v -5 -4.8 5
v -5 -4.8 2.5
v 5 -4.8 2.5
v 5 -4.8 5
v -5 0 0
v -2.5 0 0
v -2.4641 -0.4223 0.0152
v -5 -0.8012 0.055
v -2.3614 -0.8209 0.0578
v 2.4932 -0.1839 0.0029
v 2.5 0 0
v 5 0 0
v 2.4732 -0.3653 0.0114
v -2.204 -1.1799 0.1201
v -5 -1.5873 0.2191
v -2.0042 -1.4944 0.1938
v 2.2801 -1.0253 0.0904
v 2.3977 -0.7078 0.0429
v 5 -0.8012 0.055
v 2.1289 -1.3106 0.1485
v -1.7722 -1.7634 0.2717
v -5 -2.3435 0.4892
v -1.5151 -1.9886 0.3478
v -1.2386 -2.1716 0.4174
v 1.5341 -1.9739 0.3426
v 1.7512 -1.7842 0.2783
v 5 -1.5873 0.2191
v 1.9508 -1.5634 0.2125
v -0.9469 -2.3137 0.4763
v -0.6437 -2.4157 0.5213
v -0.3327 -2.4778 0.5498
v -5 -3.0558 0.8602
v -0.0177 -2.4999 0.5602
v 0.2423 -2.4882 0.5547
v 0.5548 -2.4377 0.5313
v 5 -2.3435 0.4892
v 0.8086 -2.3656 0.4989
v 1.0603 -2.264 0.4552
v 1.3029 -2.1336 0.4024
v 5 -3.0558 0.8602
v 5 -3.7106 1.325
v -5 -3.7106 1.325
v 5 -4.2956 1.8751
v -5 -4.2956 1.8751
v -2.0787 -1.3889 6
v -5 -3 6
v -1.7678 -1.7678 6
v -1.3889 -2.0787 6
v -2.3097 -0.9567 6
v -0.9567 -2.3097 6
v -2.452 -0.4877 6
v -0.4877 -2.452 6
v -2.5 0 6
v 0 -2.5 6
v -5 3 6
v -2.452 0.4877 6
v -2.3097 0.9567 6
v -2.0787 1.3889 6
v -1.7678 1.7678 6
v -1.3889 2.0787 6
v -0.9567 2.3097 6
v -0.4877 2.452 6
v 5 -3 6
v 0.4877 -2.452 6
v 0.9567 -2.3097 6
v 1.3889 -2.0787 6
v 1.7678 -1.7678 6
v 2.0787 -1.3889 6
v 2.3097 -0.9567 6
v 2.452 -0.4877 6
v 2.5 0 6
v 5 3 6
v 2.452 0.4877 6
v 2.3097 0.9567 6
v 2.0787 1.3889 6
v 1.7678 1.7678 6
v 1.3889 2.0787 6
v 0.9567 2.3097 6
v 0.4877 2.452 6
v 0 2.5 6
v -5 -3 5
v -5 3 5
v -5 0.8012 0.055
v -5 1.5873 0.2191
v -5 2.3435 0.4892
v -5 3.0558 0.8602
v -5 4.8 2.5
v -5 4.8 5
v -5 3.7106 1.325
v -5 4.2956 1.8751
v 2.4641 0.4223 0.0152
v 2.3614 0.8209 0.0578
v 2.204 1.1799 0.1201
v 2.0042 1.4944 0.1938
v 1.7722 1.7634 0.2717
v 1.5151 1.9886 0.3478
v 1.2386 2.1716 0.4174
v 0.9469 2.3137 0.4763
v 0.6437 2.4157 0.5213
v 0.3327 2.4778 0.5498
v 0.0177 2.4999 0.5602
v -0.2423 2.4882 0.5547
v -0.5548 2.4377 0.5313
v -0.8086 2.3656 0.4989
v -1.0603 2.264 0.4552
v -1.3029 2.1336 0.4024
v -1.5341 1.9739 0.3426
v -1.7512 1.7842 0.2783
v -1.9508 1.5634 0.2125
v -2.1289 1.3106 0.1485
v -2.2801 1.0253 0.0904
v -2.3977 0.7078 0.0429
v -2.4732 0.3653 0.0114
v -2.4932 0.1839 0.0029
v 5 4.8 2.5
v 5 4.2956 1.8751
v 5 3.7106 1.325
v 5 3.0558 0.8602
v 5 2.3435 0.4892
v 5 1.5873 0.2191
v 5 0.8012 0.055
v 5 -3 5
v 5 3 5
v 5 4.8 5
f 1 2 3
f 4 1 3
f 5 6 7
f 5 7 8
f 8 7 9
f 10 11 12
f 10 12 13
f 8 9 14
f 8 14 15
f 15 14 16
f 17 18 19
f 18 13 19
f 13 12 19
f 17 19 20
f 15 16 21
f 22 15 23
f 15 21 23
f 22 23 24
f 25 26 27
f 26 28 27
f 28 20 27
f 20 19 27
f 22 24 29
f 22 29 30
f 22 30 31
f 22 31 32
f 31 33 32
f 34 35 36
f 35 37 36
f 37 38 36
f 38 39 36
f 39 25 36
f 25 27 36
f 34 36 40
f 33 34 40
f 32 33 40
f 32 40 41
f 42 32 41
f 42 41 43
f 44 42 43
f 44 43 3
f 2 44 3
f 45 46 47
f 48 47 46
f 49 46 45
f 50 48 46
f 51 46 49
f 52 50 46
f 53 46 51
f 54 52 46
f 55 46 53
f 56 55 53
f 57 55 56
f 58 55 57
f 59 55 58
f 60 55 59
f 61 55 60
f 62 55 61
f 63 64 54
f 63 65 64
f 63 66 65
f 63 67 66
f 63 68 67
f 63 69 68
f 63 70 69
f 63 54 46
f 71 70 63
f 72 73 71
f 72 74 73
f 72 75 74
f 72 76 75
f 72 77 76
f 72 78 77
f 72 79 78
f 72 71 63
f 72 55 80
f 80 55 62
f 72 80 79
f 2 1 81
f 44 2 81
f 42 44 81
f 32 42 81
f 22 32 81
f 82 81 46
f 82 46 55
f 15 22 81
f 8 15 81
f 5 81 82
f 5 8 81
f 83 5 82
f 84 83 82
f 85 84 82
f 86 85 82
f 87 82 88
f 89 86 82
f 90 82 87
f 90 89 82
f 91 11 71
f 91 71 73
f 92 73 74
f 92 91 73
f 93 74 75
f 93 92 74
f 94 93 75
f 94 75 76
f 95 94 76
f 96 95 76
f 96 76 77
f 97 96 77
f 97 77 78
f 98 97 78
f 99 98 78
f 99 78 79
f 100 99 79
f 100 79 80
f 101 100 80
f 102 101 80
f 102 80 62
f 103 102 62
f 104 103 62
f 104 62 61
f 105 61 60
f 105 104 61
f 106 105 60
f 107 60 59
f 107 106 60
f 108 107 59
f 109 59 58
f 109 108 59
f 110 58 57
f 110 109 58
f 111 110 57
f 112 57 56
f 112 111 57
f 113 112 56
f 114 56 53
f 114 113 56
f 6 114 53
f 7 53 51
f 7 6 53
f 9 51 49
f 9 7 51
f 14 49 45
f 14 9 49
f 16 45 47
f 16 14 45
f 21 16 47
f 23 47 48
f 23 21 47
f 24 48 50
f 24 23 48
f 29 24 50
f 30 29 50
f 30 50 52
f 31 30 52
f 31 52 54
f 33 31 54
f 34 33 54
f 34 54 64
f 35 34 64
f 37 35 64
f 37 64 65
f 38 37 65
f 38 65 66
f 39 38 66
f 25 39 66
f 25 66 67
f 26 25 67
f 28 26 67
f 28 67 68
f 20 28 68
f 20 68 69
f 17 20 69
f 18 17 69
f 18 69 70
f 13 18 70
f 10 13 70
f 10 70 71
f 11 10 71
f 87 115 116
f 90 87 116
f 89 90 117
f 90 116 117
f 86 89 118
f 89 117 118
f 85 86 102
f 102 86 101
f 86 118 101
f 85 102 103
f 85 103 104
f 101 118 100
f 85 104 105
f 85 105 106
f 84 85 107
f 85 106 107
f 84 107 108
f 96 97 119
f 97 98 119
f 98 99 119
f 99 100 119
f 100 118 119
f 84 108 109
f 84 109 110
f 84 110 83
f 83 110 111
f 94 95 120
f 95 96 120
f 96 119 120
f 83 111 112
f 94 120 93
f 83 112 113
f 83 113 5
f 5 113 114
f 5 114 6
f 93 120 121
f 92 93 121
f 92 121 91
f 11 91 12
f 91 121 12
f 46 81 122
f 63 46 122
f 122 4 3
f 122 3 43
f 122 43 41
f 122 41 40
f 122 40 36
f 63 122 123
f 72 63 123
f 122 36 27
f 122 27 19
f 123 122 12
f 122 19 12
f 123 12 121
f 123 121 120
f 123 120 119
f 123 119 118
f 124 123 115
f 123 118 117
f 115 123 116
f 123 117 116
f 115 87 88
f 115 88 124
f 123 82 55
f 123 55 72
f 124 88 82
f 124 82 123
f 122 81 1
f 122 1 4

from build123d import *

# Parameters (mm, degrees)
SKETCH_1_W          = 10
SKETCH_1_H          = 6
SKETCH_1_R          = 2.5
EXTRUDE_1_DEPTH     = 6
SKETCH_2_W          = 10
SKETCH_2_H          = 9.6
SKETCH_2_R          = 2.5
EXTRUDE_2_DEPTH     = 5
CUT_EXTRUDE_1_DEPTH = 15


with BuildPart() as part:
    # 草图1 → 凸台-拉伸1 (new body)
    with BuildSketch(Plane.XY):
        Rectangle(SKETCH_1_W, SKETCH_1_H)
        Circle(SKETCH_1_R, mode=Mode.SUBTRACT)
    extrude(amount=EXTRUDE_1_DEPTH)

    # 草图2 → 凸台-拉伸2 (add)
    with BuildSketch(Plane.XY):
        Rectangle(SKETCH_2_W, SKETCH_2_H)
        Circle(SKETCH_2_R, mode=Mode.SUBTRACT)
    extrude(amount=EXTRUDE_2_DEPTH)

    # 草图3 → 切除-拉伸1 (cut)
    with BuildSketch(Plane(origin=(5, 0, 0), x_dir=(0, 0, -1), z_dir=(1, 0, 0))):
        with BuildLine():
            Line((0, 4.8), (-2.5, 4.8))
            ThreePointArc((-2.5, 4.8), (-0.662457295, 2.706011826), (0, 0))
            Line((0, 0), (0, 4.8))
        make_face()
        with BuildLine():
            Line((0, -4.8), (0, 0))
            ThreePointArc((0, 0), (-0.662457295, -2.706011826), (-2.5, -4.8))
            Line((-2.5, -4.8), (0, -4.8))
        make_face()
    extrude(amount=-CUT_EXTRUDE_1_DEPTH, mode=Mode.SUBTRACT)


solid = part.part
